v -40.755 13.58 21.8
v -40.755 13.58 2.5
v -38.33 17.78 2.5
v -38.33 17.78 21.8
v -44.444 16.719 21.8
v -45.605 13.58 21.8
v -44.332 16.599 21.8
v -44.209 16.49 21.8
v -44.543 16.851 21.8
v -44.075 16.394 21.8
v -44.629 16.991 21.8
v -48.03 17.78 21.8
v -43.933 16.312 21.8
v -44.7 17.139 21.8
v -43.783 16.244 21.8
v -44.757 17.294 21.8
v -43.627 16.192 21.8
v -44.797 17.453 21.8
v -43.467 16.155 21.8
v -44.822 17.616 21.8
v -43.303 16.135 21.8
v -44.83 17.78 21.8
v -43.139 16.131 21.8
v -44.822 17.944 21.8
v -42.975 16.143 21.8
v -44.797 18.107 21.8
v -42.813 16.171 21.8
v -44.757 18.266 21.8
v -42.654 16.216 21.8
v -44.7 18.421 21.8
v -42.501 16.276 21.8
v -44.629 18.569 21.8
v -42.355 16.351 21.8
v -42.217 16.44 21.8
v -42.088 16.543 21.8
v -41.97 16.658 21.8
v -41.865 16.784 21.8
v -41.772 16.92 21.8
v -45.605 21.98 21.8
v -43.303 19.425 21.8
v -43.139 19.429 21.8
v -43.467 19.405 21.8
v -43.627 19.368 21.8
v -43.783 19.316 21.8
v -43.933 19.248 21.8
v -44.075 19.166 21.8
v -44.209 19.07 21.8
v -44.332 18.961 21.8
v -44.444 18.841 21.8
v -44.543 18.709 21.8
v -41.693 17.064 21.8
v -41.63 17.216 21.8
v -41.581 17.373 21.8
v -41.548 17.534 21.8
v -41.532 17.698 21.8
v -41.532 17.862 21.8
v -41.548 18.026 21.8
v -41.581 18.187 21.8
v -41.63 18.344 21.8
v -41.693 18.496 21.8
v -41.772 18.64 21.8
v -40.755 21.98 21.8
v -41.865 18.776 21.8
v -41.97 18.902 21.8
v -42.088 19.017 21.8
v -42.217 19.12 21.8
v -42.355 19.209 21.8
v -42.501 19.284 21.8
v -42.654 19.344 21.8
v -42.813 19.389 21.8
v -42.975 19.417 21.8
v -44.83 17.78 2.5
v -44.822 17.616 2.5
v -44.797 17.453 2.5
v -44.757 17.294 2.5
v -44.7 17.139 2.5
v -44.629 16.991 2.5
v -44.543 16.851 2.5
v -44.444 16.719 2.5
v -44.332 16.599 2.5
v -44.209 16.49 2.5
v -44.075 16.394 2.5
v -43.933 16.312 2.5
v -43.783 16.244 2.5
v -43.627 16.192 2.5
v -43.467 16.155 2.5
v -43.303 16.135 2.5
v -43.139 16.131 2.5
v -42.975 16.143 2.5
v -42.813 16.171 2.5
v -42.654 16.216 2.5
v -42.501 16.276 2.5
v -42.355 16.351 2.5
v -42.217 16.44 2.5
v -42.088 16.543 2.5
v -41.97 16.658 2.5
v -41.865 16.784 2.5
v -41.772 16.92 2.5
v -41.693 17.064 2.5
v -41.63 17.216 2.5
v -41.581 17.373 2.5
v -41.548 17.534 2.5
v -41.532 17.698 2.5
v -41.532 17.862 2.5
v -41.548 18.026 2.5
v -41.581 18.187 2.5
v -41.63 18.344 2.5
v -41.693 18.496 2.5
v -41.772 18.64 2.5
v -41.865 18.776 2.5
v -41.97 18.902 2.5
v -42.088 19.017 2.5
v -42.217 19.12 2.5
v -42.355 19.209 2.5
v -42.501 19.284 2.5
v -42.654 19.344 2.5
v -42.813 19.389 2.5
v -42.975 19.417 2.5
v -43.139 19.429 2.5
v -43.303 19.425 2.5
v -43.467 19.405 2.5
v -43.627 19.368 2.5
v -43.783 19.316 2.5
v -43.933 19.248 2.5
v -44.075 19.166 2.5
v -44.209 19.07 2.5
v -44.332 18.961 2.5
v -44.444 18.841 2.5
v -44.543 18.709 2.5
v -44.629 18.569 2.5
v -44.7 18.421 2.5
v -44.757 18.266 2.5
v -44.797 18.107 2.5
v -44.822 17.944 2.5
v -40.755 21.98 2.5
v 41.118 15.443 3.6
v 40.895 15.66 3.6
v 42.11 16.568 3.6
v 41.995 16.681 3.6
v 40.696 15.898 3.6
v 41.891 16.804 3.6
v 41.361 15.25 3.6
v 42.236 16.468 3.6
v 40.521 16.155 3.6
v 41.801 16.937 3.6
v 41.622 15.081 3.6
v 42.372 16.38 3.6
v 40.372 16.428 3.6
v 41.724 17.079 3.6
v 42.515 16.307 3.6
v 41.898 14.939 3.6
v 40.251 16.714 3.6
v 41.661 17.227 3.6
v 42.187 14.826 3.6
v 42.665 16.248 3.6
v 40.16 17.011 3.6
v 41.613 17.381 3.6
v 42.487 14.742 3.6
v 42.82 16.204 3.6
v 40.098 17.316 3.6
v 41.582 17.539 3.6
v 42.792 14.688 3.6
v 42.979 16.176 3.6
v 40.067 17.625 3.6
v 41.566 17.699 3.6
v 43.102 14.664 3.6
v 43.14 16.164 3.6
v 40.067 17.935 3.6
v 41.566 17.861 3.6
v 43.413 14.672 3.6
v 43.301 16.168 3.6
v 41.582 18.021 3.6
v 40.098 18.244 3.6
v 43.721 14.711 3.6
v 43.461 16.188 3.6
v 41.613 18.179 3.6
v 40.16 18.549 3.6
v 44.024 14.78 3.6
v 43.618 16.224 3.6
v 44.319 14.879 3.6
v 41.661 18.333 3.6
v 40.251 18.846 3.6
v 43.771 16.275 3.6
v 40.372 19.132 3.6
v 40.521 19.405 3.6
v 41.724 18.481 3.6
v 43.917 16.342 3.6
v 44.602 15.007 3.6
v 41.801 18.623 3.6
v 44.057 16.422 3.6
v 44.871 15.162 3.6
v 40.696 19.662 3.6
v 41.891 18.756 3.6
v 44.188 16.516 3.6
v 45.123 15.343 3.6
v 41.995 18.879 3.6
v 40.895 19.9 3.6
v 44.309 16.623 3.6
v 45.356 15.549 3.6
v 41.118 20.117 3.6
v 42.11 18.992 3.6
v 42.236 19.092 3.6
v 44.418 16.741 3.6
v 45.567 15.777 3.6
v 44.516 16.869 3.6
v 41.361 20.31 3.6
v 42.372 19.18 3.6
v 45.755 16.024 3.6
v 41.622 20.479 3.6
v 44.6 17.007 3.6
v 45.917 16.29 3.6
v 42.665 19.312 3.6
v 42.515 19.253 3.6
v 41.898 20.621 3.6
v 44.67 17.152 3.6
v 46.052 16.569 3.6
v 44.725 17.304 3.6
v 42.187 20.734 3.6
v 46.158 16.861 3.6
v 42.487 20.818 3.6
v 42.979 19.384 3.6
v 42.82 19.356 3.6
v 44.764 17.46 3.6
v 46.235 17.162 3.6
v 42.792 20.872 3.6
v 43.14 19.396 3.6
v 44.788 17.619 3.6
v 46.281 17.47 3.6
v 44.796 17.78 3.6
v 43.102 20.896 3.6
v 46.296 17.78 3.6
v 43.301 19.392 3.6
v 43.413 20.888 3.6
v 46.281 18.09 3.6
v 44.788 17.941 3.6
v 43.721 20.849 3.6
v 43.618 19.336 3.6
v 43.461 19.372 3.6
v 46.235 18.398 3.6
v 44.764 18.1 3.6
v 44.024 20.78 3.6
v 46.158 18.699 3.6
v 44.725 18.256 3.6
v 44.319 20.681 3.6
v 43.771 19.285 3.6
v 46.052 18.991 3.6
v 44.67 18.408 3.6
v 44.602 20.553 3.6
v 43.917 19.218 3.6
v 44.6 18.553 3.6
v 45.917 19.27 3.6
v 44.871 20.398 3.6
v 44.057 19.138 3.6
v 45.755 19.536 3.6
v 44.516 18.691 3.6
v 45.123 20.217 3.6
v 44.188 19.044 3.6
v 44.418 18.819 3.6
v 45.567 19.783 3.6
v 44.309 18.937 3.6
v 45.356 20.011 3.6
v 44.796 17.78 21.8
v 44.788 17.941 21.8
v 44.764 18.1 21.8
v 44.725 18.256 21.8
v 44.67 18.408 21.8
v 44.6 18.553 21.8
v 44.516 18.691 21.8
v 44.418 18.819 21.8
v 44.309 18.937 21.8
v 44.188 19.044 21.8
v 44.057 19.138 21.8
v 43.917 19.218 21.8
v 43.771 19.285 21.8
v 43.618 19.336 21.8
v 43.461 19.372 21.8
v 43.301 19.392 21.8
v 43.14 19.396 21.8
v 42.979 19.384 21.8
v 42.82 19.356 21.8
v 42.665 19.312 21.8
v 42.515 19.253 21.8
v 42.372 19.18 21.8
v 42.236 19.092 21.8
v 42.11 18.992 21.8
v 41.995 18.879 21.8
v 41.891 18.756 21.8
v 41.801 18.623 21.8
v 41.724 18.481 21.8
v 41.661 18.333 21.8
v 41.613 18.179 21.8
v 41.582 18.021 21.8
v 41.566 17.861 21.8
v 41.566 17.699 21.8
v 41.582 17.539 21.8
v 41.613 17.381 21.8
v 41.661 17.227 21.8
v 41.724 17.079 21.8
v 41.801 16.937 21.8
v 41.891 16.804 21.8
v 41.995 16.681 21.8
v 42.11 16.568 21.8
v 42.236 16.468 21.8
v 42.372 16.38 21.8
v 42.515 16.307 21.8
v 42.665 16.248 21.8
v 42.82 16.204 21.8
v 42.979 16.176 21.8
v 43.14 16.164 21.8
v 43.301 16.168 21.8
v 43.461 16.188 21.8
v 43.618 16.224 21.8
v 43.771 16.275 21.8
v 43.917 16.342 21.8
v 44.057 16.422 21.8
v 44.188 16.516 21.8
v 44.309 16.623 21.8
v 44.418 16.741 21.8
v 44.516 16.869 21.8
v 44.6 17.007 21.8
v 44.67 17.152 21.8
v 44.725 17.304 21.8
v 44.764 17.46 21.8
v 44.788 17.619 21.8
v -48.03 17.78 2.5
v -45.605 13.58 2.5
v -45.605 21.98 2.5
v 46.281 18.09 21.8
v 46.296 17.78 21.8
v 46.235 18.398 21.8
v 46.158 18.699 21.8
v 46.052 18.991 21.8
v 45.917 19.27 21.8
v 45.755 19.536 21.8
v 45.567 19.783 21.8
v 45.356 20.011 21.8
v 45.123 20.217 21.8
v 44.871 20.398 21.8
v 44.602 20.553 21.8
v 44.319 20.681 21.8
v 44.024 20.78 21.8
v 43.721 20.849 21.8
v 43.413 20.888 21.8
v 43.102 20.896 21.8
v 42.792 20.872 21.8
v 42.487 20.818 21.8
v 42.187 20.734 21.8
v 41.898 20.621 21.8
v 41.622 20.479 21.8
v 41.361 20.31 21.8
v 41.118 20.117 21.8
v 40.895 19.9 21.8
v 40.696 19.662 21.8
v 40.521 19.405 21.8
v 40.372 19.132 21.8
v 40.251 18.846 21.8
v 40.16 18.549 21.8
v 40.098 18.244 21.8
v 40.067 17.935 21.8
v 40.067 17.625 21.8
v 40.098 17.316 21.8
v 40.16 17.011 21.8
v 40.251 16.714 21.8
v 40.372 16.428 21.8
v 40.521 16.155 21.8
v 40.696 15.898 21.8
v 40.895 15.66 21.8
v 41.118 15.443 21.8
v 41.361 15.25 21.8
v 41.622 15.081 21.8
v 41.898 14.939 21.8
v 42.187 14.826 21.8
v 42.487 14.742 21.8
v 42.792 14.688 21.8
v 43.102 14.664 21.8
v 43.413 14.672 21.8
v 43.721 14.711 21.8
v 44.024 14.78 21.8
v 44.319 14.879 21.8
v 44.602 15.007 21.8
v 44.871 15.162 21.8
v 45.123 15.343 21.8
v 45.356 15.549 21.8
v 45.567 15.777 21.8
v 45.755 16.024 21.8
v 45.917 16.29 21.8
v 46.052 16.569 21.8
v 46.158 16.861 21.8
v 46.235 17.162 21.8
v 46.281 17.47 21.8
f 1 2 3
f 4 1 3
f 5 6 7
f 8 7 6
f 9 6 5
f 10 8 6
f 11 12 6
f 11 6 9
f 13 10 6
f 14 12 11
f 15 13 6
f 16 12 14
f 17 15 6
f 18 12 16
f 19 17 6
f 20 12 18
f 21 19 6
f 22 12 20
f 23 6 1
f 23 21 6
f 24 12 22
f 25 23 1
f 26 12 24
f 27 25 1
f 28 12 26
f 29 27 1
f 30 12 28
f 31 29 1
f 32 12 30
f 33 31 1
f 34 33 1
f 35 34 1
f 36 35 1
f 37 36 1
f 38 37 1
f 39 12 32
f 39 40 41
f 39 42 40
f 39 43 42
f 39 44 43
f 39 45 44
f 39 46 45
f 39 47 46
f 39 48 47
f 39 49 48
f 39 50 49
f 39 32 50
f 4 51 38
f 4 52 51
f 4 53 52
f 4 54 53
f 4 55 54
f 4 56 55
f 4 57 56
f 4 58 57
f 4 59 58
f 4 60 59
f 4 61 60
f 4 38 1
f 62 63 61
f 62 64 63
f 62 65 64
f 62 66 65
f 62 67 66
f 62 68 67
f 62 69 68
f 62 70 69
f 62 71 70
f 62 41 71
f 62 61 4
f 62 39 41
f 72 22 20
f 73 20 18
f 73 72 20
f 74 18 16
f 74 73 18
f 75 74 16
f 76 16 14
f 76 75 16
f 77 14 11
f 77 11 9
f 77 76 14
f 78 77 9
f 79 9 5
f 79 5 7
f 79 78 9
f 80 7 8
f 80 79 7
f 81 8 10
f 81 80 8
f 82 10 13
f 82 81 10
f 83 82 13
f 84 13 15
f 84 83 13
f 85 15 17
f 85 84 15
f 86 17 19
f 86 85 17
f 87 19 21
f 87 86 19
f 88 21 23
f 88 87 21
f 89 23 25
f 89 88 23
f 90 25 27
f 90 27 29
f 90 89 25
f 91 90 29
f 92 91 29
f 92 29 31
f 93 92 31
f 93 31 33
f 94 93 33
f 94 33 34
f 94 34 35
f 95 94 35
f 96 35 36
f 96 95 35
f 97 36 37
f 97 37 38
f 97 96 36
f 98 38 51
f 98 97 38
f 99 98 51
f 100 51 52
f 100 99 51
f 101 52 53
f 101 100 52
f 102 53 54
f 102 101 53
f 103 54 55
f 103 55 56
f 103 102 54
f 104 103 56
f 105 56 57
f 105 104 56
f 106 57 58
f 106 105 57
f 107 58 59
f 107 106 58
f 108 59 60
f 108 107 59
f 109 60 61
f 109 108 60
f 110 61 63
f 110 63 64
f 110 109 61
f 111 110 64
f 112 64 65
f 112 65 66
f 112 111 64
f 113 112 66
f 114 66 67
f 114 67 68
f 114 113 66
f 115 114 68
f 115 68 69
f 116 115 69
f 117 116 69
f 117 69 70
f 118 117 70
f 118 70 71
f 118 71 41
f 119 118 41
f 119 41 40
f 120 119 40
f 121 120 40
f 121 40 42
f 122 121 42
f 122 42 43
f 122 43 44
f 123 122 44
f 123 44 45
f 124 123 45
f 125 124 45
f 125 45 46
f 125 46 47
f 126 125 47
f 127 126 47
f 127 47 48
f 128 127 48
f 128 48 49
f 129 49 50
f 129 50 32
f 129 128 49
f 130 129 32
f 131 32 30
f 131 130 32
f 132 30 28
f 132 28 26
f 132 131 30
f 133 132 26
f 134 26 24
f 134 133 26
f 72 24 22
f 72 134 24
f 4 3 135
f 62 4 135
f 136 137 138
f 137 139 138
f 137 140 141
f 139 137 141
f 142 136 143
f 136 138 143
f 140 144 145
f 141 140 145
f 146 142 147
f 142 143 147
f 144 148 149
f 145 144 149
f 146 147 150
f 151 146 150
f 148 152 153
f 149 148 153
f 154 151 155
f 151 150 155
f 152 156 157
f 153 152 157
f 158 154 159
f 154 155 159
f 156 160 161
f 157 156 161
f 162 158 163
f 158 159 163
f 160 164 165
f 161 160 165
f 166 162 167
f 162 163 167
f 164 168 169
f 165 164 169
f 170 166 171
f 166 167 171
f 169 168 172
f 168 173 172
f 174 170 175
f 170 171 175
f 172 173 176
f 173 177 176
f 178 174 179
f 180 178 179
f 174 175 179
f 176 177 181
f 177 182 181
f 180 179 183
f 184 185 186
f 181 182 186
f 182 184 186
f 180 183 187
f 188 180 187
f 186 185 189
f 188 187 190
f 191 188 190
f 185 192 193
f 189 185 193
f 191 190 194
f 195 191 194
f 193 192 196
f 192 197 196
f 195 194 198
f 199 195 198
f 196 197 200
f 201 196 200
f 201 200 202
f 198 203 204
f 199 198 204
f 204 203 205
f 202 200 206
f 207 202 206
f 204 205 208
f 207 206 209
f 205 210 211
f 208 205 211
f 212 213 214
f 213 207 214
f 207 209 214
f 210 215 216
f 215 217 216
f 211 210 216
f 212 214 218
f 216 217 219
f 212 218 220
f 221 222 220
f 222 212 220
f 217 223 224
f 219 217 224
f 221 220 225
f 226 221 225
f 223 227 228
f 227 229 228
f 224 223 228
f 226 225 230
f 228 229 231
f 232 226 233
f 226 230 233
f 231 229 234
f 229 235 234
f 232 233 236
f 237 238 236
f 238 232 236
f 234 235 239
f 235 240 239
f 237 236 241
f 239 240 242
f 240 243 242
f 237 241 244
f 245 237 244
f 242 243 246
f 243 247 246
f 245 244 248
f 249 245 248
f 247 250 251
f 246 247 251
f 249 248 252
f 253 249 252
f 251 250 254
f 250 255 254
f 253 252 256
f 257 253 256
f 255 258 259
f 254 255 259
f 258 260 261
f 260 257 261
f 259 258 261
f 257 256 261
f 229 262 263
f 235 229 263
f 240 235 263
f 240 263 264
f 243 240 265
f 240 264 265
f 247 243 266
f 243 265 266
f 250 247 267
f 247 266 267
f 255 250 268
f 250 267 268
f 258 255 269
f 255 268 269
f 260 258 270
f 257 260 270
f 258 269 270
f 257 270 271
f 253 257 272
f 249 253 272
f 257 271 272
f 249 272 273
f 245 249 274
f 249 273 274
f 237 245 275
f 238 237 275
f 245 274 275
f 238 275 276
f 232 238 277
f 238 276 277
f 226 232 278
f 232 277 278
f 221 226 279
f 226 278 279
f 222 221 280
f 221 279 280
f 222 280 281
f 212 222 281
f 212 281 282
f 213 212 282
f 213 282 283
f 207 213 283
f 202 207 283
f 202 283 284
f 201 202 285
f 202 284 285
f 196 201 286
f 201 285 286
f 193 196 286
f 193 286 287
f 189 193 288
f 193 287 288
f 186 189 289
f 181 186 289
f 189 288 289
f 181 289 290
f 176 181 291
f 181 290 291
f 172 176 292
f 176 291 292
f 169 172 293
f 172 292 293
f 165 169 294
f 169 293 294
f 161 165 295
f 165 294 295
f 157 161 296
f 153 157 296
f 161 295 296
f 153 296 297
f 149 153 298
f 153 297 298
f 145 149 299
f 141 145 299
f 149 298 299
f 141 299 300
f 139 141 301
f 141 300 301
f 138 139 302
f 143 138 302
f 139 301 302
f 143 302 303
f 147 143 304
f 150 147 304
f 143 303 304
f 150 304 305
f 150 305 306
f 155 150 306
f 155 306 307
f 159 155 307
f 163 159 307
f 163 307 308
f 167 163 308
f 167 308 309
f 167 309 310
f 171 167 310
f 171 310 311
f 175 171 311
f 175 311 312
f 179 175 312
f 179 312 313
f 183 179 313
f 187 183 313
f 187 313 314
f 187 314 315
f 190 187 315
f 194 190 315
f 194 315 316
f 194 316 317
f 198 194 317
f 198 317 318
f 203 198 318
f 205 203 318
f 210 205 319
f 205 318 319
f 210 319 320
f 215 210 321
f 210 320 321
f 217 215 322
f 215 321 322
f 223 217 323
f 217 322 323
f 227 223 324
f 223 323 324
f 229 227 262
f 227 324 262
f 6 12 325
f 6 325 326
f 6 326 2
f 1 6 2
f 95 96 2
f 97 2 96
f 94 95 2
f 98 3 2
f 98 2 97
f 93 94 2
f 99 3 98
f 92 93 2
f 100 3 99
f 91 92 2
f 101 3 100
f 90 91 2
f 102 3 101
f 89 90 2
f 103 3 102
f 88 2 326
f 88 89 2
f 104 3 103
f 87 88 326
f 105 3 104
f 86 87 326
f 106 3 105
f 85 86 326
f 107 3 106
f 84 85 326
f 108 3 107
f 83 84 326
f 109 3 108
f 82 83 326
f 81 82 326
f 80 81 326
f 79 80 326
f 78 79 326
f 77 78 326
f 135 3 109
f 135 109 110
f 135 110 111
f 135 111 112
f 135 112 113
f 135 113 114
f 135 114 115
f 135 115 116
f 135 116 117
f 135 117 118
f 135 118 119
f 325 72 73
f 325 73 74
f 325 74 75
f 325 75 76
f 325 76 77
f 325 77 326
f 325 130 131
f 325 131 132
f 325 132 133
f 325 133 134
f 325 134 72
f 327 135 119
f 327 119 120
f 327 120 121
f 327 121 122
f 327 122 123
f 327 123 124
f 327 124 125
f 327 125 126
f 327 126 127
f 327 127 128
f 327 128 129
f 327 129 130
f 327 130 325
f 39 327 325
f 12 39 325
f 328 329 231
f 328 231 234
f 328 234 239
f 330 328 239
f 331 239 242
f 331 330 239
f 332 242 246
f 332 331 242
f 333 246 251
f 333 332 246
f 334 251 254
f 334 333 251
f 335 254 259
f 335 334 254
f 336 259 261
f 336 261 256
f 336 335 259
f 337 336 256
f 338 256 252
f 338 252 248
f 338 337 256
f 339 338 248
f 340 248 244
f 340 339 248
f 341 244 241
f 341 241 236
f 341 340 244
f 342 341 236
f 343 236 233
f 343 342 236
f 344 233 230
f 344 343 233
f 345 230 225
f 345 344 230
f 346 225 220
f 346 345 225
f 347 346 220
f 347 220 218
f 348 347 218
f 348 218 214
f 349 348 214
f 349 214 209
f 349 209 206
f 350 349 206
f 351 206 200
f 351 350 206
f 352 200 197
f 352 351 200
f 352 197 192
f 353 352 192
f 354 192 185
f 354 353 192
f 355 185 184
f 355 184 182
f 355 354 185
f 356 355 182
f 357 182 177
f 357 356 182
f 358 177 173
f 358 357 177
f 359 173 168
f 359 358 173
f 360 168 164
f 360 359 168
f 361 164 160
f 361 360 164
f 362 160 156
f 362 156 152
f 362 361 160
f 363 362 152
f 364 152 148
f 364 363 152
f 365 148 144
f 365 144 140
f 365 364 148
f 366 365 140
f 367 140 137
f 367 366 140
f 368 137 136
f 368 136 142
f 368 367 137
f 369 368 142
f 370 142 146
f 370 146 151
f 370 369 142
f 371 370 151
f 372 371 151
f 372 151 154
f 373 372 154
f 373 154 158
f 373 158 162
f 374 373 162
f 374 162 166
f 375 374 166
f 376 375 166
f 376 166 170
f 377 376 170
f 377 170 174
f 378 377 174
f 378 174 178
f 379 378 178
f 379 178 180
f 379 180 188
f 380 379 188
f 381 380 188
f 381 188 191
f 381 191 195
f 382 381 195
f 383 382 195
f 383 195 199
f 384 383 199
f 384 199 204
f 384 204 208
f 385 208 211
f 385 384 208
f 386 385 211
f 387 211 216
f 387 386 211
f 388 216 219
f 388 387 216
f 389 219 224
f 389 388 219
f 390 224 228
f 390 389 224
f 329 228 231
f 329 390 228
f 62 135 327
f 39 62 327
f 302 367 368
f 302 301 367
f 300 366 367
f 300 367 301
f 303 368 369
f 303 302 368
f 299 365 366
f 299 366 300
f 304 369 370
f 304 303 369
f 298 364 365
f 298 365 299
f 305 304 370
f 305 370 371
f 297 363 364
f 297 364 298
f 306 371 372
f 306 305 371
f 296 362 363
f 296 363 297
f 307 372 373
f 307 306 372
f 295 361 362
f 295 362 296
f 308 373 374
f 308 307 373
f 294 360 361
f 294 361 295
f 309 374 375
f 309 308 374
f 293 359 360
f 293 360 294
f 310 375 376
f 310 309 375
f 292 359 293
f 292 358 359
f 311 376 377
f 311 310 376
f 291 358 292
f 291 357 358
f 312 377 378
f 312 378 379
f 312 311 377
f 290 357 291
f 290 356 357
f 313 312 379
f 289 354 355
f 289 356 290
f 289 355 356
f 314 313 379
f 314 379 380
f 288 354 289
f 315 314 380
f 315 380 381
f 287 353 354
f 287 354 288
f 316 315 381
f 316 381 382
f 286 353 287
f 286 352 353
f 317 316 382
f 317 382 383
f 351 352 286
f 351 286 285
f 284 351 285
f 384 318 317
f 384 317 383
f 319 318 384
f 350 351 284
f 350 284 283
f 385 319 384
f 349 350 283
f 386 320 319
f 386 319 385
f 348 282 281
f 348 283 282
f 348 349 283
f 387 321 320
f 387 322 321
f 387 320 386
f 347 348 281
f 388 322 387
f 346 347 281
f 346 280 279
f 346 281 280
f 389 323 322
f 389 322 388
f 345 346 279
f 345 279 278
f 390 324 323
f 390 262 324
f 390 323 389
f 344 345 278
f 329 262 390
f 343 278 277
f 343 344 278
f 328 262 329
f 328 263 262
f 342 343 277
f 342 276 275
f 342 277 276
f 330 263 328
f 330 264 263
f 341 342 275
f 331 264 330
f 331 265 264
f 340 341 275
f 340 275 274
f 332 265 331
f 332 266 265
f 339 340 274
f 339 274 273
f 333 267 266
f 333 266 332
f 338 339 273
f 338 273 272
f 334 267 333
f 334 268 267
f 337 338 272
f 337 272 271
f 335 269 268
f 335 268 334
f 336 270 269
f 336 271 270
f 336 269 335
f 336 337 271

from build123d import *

# Parameters (mm, degrees)
BOSS_EXTRUDE1_DEPTH = 2.5
SKETCH2_R           = 1.65
BOSS_EXTRUDE2_DEPTH = 19.3
SKETCH3_R           = 3.1165
SKETCH3_R_2         = 1.6165
BOSS_EXTRUDE3_DEPTH = 18.2
CUT_EXTRUDE1_DEPTH  = 2.5


with BuildPart() as part:
    # Sketch1 → Boss-Extrude1 (new body)
    with BuildSketch(Plane.XY):
        Polygon((-38.330257739, 17.78), (-40.755128869, 21.98), (-45.604871131, 21.98), (-48.029742261, 17.78), (-45.604871131, 13.58), (-40.755128869, 13.58), align=None)
        Polygon((-41.505684219, 20.68), (-44.854315781, 20.68), (-46.528631561, 17.78), (-44.854315781, 14.88), (-41.505684219, 14.88), (-39.831368439, 17.78), align=None, mode=Mode.SUBTRACT)
    extrude(amount=BOSS_EXTRUDE1_DEPTH)

    # Sketch2 → Boss-Extrude2 (add)
    with BuildSketch(Plane.XY.offset(2.5)):
        Polygon((-40.755128869, 13.58), (-38.330257739, 17.78), (-40.755128869, 21.98), (-45.604871131, 21.98), (-48.029742261, 17.78), (-45.604871131, 13.58), align=None)
        with Locations(Location((-43.18, 17.78, 0), (0, 0, 180))):
            Circle(SKETCH2_R, mode=Mode.SUBTRACT)
    extrude(amount=BOSS_EXTRUDE2_DEPTH)

    # Sketch4 → Cut-Extrude1 (cut)
    with BuildSketch(Plane(origin=(0, 0, 0), x_dir=(-1, 0, 0), z_dir=(0, 0, -1))):
        Polygon((38.330257739, 17.78), (40.755128869, 13.58), (45.604871131, 13.58), (48.029742261, 17.78), (45.604871131, 21.98), (40.755128869, 21.98), align=None)
    extrude(amount=-CUT_EXTRUDE1_DEPTH, mode=Mode.SUBTRACT)


with BuildPart() as body_2:
    # Sketch3 → Boss-Extrude3 (new body)
    with BuildSketch(Plane.XY.offset(21.8)):
        with Locations((43.18, 17.78)):
            Circle(SKETCH3_R)
        with Locations((43.18, 17.78)):
            Circle(SKETCH3_R_2, mode=Mode.SUBTRACT)
    extrude(amount=-BOSS_EXTRUDE3_DEPTH)


solid = Compound([part.part, body_2.part])
